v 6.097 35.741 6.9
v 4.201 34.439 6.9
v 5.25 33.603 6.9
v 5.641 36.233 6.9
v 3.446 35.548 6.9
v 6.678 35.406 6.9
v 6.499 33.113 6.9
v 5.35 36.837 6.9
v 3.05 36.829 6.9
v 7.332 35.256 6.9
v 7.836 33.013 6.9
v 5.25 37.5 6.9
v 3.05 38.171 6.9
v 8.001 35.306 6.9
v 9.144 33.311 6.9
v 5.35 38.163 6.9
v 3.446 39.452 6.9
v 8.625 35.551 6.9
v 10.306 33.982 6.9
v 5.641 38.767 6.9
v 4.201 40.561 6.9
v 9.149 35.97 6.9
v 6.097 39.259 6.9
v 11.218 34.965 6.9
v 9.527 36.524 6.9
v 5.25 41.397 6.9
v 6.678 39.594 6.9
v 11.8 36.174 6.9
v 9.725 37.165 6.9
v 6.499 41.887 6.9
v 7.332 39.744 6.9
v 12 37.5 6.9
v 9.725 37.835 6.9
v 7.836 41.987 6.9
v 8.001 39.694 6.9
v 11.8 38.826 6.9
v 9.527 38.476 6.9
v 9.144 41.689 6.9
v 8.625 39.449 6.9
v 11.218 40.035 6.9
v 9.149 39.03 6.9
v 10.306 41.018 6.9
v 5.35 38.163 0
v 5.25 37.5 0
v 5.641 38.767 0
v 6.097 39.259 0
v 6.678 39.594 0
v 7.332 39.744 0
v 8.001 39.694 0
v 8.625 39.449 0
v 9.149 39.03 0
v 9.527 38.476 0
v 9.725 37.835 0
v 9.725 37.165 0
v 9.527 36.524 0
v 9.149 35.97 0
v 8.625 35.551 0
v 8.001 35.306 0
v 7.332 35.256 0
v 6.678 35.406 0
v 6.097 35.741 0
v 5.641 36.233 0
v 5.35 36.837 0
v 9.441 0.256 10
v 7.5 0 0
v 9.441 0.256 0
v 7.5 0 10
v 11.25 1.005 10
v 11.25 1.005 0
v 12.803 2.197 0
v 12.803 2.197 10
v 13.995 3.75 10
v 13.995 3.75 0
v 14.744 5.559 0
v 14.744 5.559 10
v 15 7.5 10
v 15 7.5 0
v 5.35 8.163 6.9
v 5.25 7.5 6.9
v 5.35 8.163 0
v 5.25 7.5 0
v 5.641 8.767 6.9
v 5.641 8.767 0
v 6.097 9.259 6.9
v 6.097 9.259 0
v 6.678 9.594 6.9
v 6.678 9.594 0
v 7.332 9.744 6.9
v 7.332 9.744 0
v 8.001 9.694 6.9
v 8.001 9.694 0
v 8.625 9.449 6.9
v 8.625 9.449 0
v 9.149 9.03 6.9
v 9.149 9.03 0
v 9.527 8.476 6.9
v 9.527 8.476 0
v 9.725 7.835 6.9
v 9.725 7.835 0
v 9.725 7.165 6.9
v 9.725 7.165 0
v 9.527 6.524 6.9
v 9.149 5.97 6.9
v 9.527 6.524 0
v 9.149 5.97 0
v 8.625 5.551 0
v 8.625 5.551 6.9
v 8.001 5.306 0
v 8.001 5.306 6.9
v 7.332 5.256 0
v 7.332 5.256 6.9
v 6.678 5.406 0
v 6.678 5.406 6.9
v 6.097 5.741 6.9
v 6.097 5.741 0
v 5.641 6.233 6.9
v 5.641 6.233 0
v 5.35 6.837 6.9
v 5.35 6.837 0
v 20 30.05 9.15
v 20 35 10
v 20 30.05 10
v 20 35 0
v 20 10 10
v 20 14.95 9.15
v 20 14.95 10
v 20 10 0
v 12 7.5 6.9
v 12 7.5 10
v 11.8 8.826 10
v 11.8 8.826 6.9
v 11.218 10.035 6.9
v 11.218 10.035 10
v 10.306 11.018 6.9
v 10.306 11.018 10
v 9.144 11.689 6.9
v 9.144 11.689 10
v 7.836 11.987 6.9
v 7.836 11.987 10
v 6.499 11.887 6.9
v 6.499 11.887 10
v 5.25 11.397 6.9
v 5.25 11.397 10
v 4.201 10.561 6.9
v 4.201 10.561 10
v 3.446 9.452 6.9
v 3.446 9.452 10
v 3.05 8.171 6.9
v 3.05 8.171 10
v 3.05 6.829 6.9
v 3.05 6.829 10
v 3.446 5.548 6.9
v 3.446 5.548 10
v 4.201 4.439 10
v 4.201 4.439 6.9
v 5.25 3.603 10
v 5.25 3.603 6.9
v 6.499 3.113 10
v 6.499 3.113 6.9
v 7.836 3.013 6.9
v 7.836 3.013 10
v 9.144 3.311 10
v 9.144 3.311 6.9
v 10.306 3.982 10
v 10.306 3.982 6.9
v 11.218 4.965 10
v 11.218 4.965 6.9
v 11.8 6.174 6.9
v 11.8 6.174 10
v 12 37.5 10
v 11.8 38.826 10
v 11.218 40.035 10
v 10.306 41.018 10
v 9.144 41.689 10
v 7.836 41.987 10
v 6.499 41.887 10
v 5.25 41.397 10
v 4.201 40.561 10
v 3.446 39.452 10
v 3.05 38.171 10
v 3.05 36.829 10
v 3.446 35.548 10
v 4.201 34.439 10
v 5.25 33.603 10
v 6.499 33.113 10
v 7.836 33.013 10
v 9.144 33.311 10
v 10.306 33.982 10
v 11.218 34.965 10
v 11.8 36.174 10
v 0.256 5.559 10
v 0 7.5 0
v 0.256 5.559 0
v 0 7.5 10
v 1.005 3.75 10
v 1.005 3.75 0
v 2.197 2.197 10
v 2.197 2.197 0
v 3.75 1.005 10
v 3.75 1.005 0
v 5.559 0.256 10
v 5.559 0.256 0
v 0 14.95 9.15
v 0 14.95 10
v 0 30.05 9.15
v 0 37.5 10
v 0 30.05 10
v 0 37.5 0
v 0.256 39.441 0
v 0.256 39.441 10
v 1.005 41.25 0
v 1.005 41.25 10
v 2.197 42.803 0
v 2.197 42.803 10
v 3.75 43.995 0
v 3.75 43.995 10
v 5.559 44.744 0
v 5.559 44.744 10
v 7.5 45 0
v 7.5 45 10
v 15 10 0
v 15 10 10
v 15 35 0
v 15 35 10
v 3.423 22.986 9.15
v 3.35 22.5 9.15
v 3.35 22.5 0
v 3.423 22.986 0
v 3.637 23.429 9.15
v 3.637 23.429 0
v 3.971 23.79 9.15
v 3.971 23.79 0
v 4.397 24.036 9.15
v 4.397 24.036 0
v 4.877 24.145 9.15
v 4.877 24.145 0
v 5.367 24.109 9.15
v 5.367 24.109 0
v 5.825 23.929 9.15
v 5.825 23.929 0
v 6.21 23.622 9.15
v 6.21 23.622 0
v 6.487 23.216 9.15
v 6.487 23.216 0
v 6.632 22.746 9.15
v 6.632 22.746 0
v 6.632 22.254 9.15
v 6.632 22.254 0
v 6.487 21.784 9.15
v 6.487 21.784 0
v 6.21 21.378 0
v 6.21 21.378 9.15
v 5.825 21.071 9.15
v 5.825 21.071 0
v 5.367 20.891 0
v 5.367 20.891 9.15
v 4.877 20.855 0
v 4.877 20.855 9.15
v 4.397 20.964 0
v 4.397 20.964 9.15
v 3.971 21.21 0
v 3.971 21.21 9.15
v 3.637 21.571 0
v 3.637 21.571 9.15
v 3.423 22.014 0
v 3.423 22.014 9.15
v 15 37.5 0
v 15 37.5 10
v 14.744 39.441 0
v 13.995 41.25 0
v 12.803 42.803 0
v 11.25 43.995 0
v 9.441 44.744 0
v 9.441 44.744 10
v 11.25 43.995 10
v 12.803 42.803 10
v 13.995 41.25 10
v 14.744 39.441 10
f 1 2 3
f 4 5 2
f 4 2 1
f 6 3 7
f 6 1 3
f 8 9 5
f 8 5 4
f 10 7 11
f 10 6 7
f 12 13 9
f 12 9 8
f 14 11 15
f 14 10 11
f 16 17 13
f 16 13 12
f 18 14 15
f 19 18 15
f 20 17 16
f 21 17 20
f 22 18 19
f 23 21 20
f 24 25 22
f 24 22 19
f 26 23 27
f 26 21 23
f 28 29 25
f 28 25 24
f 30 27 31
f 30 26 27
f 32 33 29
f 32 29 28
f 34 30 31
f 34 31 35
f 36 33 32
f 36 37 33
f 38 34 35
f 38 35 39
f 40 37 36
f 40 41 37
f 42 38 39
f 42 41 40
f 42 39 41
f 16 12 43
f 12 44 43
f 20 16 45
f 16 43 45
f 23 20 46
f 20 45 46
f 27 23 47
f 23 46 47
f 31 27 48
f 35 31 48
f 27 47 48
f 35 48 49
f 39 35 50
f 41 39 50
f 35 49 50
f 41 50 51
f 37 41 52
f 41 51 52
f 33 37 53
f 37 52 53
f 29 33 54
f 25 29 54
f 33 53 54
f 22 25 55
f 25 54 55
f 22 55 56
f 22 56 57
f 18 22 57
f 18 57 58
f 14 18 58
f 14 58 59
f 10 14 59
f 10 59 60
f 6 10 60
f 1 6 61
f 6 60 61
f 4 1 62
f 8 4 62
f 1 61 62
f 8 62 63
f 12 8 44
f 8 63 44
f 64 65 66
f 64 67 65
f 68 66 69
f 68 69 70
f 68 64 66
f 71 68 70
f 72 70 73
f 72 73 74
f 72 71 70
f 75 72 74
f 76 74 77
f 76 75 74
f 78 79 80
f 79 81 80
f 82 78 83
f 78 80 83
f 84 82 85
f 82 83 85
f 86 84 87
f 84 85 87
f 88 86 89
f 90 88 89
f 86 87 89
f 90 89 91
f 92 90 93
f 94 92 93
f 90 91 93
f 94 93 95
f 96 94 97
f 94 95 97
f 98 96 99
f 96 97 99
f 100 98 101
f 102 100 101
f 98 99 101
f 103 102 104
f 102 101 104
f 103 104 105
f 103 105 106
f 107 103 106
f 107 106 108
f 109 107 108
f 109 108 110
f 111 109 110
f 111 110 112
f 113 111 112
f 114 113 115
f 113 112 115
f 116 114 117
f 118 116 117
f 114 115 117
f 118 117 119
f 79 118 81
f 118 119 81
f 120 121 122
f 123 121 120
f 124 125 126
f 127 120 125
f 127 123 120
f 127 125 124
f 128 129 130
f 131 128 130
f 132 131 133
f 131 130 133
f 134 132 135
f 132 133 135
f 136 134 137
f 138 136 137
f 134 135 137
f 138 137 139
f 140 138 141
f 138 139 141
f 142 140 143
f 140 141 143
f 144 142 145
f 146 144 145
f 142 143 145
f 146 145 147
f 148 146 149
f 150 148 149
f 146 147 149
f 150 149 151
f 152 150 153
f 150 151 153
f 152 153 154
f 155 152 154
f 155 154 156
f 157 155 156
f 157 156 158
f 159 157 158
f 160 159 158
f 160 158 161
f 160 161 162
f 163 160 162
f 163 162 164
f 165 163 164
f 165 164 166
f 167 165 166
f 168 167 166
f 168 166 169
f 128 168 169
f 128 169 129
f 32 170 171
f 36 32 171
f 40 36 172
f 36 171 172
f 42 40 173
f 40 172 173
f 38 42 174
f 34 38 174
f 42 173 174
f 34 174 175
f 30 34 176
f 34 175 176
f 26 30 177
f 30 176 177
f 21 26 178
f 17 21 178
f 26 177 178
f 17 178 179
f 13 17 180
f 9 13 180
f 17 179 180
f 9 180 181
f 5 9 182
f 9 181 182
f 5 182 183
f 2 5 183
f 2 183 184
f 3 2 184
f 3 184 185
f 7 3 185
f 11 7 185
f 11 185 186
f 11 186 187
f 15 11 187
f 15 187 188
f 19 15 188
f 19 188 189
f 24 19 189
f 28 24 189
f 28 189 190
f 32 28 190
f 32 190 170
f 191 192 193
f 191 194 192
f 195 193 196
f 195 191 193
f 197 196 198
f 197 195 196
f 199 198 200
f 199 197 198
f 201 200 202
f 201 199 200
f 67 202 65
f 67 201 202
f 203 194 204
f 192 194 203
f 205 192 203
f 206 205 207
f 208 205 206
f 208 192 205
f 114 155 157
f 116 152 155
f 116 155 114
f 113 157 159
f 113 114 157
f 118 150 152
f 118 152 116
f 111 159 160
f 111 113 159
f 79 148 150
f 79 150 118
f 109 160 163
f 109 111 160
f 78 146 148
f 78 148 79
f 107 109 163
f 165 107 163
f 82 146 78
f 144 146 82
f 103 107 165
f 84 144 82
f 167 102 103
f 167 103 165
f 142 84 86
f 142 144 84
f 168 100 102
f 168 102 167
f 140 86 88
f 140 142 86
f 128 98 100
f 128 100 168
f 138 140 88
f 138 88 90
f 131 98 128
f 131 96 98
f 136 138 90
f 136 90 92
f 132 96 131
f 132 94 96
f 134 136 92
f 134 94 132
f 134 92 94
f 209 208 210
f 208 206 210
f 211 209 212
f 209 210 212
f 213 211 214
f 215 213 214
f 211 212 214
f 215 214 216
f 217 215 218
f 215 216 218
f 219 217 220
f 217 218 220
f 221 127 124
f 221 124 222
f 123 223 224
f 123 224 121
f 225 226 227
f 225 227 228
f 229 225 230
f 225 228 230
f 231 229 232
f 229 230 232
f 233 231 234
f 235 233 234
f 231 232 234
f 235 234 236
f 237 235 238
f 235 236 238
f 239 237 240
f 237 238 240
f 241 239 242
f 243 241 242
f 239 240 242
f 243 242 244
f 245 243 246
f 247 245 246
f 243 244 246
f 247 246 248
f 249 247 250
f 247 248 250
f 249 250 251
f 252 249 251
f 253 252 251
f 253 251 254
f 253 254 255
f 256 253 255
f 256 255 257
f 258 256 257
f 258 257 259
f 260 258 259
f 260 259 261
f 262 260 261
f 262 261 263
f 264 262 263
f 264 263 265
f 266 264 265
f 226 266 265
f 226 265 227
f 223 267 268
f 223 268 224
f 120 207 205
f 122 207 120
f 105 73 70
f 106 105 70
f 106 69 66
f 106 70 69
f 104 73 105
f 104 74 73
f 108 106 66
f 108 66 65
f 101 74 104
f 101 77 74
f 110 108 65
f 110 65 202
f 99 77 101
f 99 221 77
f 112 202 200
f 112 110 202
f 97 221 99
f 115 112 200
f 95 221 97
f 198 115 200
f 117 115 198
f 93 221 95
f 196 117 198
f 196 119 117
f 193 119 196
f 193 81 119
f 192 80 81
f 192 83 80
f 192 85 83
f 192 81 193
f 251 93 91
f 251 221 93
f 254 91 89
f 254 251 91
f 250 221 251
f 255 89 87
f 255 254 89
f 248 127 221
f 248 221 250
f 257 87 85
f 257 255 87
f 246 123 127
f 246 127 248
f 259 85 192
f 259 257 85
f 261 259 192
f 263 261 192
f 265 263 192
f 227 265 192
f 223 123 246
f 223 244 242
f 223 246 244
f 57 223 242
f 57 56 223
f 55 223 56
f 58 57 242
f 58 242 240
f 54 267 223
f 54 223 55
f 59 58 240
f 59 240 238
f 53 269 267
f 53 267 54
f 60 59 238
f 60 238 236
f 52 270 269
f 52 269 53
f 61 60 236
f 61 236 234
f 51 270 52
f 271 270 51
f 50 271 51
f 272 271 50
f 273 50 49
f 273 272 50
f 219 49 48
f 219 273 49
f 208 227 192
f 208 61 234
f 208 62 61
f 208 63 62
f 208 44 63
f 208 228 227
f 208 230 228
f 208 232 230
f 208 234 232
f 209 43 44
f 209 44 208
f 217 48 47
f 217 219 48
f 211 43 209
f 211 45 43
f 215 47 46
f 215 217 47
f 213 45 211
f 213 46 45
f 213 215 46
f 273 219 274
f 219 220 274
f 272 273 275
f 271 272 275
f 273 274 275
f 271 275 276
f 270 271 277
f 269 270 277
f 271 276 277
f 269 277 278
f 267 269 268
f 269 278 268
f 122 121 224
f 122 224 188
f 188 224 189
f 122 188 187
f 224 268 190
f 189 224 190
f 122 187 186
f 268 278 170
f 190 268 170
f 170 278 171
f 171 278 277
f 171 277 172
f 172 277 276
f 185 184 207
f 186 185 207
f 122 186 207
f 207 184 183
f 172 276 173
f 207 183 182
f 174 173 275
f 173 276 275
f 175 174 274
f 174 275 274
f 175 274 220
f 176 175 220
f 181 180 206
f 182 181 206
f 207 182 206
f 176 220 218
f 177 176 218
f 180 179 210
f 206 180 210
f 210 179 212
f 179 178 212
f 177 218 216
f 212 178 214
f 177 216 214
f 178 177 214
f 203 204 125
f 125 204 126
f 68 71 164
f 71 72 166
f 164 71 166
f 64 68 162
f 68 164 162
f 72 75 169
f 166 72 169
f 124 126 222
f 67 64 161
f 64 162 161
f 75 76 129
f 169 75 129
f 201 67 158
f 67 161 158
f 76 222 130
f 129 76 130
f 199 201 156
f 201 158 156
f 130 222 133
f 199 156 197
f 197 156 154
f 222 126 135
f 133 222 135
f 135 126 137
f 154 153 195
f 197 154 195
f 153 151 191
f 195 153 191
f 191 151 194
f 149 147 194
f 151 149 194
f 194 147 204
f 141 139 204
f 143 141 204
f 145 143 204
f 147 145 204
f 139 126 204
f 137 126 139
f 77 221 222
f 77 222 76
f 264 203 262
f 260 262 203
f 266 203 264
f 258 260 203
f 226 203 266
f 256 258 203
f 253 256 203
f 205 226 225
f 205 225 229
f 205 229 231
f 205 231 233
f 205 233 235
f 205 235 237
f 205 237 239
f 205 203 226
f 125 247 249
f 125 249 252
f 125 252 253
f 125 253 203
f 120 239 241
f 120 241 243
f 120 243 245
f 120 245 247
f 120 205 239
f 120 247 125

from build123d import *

# Parameters (mm, degrees)
AUFSATZ_LINEAR_AUSTRAGEN1_DEPTH                      = 10
SKIZZE2_W                                            = 20
SKIZZE2_H                                            = 15.1
SCHNITT_LINEAR_AUSTRAGEN1_DEPTH                      = 0.85
STIRNSENKUNG_F_R_M4_FLACHKOPFSCHRAUBE_MI_D           = 4.5
STIRNSENKUNG_F_R_M4_FLACHKOPFSCHRAUBE_MI_CBORE_D     = 9
STIRNSENKUNG_F_R_M4_FLACHKOPFSCHRAUBE_MI_CBORE_DEPTH = 3.1
M4_GEWINDEBOHRUNG1_D                                 = 3.3
VERRUNDUNG1_R                                        = 7.5


with BuildPart() as part:
    # Skizze1 → Aufsatz-Linear austragen1 (new body)
    with BuildSketch(Plane.XY):
        Polygon((0, 0), (0, 45), (15, 45), (15, 35), (20, 35), (20, 10), (15, 10), (15, 0), align=None)
    extrude(amount=AUFSATZ_LINEAR_AUSTRAGEN1_DEPTH)

    # Skizze2 → Schnitt-Linear austragen1 (cut)
    with BuildSketch(Plane.XY.offset(10)):
        with Locations((10, 22.5)):
            Rectangle(SKIZZE2_W, SKIZZE2_H)
    extrude(amount=-SCHNITT_LINEAR_AUSTRAGEN1_DEPTH, mode=Mode.SUBTRACT)

    # Stirnsenkung für M4 Flachkopfschraube mit Schlitz1 (through all)
    with Locations(Plane.XY.offset(10)):
        with Locations((7.5, 37.5), (7.5, 7.5)):
            CounterBoreHole(STIRNSENKUNG_F_R_M4_FLACHKOPFSCHRAUBE_MI_D / 2, STIRNSENKUNG_F_R_M4_FLACHKOPFSCHRAUBE_MI_CBORE_D / 2, STIRNSENKUNG_F_R_M4_FLACHKOPFSCHRAUBE_MI_CBORE_DEPTH)

    # M4 Gewindebohrung1 (through all)
    with Locations(Plane.XY.offset(9.15)):
        with Locations((5, 22.5)):
            Hole(M4_GEWINDEBOHRUNG1_D / 2)

    # Verrundung1
    verrundung1_edges = [part.edges().sort_by_distance(p)[0] for p in [
        (0, 0, 5),
        (15, 0, 5),
        (15, 45, 5),
        (0, 45, 5),
    ]]
    fillet(verrundung1_edges, radius=VERRUNDUNG1_R - 0.0001)  # a hair under: the kernel refuses the full size


solid = part.part
